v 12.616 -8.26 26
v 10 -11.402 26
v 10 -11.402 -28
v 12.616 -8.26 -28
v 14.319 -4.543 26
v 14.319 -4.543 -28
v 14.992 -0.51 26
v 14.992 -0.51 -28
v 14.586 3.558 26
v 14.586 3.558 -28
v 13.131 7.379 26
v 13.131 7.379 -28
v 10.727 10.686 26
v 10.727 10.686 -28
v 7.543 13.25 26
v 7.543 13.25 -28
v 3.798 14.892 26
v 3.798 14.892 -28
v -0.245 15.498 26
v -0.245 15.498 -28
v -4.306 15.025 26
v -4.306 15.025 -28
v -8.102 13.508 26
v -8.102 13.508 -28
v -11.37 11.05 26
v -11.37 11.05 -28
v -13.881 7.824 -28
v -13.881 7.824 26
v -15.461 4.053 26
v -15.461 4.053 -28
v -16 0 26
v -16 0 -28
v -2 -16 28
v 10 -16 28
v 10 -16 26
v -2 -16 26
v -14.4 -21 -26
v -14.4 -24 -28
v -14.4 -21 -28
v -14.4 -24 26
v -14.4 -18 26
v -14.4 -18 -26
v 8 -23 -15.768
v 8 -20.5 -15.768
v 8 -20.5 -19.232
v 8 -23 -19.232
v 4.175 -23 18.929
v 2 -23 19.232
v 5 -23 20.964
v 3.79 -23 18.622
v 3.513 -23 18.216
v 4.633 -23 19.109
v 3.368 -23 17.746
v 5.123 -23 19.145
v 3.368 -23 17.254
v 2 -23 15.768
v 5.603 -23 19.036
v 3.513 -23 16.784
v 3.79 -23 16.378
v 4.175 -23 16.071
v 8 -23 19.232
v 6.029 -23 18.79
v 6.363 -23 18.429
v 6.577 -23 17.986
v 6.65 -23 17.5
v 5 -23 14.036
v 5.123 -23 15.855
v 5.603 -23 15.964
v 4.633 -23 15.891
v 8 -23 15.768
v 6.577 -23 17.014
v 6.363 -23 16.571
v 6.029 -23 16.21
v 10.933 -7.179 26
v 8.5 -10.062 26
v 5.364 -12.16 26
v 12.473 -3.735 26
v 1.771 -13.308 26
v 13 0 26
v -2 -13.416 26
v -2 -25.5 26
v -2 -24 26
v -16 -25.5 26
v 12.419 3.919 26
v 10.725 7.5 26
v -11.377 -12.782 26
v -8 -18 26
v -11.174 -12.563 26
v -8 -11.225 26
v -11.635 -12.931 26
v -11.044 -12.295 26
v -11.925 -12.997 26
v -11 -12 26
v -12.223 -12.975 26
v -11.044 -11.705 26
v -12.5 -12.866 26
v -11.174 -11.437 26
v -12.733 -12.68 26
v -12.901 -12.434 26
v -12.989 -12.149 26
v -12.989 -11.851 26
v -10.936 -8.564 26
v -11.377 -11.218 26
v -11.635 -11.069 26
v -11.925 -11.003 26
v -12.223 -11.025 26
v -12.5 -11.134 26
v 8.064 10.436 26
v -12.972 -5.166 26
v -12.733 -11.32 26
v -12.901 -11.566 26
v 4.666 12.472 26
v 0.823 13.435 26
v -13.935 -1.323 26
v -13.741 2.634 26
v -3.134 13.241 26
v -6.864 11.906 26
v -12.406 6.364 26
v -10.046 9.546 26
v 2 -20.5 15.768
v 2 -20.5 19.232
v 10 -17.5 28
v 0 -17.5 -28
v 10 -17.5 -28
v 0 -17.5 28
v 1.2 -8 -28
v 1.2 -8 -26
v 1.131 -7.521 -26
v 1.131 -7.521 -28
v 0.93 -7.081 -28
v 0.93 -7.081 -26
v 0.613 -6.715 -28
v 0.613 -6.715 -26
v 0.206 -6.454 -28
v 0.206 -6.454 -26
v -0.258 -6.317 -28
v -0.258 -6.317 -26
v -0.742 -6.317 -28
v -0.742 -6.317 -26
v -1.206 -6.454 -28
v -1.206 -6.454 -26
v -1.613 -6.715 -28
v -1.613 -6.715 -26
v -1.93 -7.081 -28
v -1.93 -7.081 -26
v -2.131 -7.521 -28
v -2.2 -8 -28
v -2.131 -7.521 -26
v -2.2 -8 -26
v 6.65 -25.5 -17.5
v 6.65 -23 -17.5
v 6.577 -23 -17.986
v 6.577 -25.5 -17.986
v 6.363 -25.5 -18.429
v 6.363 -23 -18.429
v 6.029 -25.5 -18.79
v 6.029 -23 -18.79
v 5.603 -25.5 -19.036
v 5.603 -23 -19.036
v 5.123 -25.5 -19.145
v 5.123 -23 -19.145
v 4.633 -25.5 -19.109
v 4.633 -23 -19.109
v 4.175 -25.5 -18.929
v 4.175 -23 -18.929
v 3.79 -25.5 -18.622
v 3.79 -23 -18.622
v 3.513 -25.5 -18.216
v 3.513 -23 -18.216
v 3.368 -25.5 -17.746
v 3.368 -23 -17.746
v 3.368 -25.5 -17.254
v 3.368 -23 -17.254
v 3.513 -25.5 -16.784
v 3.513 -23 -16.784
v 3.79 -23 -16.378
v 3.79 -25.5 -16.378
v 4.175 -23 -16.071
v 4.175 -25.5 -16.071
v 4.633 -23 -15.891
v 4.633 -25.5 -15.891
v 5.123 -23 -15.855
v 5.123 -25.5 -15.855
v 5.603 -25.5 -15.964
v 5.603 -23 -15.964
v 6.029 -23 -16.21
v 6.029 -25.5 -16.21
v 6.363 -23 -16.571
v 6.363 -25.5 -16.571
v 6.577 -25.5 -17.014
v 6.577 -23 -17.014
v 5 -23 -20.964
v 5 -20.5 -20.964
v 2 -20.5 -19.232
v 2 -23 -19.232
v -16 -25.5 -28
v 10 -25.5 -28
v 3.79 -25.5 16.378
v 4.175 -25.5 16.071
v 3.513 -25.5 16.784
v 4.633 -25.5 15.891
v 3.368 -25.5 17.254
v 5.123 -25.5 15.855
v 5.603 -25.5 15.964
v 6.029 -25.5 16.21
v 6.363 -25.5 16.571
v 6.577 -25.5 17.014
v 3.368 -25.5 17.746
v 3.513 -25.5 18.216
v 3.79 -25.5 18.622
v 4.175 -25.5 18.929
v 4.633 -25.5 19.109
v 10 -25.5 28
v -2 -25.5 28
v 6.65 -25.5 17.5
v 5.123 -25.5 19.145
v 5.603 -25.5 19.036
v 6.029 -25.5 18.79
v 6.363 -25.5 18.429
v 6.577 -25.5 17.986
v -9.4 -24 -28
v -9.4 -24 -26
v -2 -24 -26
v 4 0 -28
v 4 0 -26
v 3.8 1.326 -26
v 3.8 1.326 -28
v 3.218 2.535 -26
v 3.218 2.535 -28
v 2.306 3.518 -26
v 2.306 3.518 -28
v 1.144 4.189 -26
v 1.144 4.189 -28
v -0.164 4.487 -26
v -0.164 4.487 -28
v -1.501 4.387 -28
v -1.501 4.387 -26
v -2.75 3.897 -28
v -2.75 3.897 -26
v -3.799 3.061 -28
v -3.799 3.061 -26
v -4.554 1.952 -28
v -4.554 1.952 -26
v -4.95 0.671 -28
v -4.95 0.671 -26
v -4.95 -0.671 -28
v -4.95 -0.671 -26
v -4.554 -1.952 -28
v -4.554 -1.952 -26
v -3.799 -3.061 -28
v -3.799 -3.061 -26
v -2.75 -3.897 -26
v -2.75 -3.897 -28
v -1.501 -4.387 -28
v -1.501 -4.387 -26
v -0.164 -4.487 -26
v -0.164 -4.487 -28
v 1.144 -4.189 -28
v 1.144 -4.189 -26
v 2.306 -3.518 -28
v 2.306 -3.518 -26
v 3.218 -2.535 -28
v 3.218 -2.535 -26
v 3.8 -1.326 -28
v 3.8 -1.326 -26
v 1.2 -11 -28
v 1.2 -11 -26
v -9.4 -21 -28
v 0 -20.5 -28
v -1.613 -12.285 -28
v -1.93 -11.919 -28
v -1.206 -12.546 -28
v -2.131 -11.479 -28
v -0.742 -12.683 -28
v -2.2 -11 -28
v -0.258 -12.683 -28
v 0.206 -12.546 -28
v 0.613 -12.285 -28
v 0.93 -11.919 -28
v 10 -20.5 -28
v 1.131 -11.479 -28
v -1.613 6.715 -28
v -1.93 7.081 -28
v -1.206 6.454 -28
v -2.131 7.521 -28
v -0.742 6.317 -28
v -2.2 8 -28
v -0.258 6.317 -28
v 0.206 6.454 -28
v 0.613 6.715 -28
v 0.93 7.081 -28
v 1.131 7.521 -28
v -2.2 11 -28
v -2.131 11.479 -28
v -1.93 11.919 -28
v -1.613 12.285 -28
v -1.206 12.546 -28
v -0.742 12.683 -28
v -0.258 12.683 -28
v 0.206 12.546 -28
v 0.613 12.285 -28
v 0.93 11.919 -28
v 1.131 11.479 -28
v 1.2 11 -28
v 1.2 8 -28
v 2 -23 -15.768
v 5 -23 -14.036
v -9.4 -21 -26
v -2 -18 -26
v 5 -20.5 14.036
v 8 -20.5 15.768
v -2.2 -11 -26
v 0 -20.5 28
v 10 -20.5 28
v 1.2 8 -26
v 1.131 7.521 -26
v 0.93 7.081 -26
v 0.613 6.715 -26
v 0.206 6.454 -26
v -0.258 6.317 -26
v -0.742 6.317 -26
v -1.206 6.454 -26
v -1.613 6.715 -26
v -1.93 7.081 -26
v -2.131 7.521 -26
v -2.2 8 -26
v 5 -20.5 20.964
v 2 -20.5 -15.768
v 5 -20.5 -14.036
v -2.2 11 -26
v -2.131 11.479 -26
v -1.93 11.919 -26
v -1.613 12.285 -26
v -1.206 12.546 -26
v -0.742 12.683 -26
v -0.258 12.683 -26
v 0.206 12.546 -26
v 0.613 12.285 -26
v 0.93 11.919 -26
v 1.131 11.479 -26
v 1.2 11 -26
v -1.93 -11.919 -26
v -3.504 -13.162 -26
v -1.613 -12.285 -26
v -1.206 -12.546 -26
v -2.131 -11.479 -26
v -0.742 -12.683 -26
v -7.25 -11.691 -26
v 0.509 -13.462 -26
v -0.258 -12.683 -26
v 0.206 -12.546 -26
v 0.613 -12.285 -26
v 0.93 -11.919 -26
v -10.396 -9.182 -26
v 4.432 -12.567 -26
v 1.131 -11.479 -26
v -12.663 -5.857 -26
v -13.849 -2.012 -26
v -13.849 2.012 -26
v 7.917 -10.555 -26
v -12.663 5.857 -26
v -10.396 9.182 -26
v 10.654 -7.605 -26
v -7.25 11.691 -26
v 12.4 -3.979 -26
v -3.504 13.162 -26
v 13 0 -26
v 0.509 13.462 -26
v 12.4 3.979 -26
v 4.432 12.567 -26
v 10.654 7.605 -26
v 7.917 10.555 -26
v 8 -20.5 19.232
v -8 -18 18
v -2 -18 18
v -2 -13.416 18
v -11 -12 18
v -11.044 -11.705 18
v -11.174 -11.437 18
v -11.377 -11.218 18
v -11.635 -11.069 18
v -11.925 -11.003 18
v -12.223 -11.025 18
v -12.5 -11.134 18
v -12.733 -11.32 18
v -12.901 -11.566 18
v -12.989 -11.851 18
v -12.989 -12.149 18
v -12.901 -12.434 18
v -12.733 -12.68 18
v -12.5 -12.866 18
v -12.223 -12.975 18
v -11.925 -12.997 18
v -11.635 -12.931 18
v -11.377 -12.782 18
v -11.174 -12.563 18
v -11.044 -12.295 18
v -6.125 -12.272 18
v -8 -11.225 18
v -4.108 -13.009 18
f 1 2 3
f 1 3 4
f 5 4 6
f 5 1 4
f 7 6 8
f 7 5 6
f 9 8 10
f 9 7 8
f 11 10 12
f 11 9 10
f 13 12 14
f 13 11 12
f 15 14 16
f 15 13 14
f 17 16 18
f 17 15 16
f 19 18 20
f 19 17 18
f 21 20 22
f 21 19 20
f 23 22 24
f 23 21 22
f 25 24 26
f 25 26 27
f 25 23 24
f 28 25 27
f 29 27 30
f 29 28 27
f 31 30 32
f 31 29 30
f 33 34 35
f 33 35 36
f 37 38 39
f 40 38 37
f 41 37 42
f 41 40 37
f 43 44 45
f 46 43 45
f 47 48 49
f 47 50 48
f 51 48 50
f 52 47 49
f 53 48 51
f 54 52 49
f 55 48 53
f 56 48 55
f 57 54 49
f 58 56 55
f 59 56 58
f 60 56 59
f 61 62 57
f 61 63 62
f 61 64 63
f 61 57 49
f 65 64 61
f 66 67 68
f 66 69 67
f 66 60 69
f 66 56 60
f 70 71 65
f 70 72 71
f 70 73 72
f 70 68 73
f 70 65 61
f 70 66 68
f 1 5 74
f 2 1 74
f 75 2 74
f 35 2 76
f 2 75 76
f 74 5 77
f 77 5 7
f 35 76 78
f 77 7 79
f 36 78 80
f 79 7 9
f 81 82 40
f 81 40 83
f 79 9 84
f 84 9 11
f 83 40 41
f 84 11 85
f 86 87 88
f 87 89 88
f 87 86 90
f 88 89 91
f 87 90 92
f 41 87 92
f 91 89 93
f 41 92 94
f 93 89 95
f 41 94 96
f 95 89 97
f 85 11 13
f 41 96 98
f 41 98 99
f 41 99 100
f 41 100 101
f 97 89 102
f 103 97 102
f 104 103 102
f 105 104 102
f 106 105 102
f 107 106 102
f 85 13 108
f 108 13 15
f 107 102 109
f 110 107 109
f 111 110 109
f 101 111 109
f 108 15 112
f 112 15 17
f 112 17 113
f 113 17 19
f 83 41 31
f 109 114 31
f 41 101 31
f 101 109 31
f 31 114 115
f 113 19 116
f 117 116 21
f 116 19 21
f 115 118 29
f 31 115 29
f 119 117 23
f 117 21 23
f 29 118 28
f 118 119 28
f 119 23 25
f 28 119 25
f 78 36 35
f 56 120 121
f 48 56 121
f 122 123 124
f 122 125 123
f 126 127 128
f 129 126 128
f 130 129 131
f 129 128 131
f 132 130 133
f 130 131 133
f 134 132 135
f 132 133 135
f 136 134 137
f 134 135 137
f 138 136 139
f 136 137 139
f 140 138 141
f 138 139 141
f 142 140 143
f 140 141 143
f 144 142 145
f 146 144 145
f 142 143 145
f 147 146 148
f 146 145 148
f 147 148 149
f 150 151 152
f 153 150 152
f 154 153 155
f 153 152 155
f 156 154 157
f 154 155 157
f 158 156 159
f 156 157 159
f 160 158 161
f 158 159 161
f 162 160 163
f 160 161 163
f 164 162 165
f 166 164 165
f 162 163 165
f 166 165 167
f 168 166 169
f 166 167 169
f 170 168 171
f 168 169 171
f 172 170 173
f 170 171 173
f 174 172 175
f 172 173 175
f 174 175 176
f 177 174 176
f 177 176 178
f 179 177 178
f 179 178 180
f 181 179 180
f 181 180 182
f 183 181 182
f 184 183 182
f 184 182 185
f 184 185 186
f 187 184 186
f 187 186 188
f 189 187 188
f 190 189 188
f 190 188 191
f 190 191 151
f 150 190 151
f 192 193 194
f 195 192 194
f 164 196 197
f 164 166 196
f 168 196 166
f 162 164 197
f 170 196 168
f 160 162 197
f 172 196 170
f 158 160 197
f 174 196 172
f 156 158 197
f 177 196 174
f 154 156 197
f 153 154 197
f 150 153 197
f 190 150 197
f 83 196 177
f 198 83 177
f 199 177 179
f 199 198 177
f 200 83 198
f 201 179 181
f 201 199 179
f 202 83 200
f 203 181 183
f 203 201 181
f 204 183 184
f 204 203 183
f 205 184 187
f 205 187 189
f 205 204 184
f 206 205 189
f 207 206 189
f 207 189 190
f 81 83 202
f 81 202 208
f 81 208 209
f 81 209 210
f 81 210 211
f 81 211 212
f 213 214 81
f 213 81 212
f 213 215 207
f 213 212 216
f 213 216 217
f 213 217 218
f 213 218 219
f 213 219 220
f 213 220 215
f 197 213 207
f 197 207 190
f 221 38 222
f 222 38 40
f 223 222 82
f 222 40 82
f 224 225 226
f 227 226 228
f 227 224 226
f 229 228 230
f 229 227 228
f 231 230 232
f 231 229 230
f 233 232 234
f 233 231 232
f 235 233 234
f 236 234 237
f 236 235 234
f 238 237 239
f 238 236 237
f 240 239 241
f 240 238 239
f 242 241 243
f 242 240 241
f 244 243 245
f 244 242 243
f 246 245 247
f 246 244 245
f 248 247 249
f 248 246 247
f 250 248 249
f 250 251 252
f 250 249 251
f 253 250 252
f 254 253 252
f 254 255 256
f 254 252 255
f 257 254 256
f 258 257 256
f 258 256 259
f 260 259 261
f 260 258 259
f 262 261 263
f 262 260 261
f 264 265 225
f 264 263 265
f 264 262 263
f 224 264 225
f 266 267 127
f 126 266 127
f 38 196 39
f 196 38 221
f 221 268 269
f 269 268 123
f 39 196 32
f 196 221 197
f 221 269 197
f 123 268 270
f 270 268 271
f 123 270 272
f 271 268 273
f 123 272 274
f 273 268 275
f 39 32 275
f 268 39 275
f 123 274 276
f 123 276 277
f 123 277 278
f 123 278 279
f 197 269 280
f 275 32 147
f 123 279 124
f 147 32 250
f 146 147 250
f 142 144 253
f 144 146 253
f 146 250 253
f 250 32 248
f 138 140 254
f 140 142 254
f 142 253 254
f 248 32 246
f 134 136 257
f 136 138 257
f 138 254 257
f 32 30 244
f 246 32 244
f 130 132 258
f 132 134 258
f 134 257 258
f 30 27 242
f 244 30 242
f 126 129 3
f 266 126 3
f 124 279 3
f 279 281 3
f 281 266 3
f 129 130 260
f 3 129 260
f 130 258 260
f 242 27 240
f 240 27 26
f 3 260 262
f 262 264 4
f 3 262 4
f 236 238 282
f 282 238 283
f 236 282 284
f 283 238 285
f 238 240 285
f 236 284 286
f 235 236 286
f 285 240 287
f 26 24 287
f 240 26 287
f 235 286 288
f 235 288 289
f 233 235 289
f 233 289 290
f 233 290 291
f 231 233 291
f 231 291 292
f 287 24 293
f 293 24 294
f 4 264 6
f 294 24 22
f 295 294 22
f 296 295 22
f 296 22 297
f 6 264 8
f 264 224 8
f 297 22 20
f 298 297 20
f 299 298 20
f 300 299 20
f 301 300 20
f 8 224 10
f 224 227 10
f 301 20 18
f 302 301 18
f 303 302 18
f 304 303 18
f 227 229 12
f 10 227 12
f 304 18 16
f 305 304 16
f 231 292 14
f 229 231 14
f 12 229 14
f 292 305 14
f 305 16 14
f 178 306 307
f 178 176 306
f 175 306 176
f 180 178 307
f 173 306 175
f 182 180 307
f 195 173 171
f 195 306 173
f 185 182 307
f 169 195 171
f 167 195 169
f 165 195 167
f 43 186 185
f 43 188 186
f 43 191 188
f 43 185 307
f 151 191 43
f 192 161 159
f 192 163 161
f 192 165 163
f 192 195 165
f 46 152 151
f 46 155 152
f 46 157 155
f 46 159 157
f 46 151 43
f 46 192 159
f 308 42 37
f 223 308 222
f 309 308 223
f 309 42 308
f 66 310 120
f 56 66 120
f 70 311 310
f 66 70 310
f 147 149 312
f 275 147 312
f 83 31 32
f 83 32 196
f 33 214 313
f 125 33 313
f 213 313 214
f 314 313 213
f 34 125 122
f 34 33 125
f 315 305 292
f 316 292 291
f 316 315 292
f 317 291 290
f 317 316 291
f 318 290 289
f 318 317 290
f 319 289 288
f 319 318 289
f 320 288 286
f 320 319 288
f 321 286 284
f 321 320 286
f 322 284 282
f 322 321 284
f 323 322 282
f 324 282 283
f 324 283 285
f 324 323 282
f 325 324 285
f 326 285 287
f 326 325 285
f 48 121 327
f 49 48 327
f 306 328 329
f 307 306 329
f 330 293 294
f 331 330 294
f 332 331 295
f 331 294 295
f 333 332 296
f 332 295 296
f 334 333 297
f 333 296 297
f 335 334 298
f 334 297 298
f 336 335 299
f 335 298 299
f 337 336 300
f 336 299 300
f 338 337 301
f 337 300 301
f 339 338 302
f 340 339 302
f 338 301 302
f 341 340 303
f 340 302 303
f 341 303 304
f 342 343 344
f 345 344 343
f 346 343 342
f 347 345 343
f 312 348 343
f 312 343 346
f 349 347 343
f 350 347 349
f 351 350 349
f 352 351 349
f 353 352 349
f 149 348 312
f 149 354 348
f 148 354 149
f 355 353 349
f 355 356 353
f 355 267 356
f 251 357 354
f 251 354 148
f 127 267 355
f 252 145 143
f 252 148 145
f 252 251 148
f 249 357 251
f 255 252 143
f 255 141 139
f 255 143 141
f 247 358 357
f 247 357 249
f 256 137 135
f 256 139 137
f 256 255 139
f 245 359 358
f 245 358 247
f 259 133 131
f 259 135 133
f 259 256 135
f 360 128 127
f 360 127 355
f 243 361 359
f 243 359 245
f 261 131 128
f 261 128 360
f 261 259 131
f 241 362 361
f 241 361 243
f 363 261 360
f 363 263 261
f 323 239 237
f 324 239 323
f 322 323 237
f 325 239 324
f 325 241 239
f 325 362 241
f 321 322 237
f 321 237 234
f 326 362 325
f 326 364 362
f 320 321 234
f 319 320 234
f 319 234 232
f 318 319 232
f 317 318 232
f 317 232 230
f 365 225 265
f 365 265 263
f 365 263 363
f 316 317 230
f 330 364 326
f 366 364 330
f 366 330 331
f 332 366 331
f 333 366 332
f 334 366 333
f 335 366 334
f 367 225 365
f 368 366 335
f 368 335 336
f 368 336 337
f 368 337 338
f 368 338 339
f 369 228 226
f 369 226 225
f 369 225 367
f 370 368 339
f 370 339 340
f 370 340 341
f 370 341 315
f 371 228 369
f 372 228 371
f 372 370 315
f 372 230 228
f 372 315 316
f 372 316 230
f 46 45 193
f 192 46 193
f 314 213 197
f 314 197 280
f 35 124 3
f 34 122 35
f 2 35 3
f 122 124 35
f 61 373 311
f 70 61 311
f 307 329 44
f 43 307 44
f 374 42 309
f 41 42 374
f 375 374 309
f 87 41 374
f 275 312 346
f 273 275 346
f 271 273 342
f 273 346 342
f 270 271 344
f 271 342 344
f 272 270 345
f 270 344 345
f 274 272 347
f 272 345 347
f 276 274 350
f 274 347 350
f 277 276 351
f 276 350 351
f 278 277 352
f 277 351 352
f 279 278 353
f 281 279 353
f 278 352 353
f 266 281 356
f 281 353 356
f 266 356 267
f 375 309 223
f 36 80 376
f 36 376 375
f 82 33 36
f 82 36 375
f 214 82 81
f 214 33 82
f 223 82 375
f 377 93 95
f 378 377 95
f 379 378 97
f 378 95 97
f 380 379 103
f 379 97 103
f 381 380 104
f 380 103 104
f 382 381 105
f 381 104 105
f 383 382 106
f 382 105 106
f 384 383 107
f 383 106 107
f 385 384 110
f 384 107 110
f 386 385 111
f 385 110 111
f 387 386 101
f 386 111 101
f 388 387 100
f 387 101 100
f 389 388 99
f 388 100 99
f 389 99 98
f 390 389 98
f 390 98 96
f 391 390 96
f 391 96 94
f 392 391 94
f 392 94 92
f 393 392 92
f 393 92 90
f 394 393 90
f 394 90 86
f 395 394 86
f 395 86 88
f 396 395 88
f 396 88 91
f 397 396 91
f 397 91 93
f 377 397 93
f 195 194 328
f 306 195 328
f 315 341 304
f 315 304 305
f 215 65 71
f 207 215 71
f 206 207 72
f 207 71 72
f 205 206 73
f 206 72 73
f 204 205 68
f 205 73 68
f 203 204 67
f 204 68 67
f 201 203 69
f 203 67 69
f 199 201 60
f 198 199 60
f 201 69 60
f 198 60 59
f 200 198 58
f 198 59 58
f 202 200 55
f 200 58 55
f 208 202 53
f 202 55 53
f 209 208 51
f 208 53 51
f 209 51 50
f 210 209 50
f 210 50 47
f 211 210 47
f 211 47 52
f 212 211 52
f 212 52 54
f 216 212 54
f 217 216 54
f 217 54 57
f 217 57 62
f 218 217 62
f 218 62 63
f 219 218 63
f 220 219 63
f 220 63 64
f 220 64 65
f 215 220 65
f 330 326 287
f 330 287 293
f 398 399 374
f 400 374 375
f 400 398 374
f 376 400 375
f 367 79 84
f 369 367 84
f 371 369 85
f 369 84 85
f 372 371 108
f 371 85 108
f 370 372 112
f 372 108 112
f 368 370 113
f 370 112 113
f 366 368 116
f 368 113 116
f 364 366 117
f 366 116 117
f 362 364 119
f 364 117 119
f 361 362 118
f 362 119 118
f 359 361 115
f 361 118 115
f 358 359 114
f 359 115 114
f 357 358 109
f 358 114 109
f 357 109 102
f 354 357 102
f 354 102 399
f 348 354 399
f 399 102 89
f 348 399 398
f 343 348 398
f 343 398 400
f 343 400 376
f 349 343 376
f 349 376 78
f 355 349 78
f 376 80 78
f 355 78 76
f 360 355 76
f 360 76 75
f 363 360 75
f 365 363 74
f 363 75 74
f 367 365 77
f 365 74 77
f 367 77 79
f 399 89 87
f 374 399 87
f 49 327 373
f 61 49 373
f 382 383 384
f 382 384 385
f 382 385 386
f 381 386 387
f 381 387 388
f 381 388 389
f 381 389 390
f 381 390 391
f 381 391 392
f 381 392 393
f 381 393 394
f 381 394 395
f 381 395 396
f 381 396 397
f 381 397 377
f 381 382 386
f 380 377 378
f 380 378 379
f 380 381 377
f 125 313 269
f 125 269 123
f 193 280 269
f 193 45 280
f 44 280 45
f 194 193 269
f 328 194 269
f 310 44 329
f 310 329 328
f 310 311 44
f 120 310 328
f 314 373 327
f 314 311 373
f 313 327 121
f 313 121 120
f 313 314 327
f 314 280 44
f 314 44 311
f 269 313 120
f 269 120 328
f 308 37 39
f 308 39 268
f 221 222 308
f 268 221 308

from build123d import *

# Parameters (mm, degrees)
ESBO_O1_R                = 4.5
RESSALTO_EXTRUS_O1_DEPTH = 28
CORTE_EXTRUS_O5_START    = 28
ESBO_O1_3_R              = 13.5
ESBO_O1_3_W              = 12.4
ESBO_O1_3_H              = 6
CORTE_EXTRUS_O5_DEPTH    = 54
ESBO_O3_R                = 1
CORTE_EXTRUS_O3_DEPTH    = 10
CORTE_EXTRUS_O4_DEPTH    = 2
ESBO_O5_R                = 1.65
CORTE_EXTRUS_O6_DEPTH    = 2.5
ESBO_O5_2_R              = 1.65
CORTE_EXTRUS_O7_DEPTH    = 6
ESBO_O6_W                = 5
ESBO_O6_H                = 3
CORTE_EXTRUS_O8_DEPTH    = 3


with BuildPart() as part:
    # Esboço1 → Ressalto-extrusão1 (new body, symmetric)
    with BuildSketch(Plane.XY):
        with BuildLine():
            Line((-16, 0), (-16, -25.5))
            Line((-16, -25.5), (10, -25.5))
            Line((10, -25.5), (10, -20.5))
            Line((10, -20.5), (0, -20.5))
            Line((0, -20.5), (0, -17.5))
            Line((0, -17.5), (10, -17.5))
            Line((10, -17.5), (10, -11.401754251))
            ThreePointArc((10, -11.401754251), (5.724949799, 14.195069567), (-16, 0))
        make_face()
        with Locations((-0.5, 0)):
            Circle(ESBO_O1_R, mode=Mode.SUBTRACT)
        with BuildLine():
            Line((-2.2, 8), (-2.2, 11))
            ThreePointArc((-2.2, 11), (-0.5, 12.7), (1.2, 11))
            Line((1.2, 11), (1.2, 8))
            ThreePointArc((1.2, 8), (-0.5, 6.3), (-2.2, 8))
        make_face(mode=Mode.SUBTRACT)
        with BuildLine():
            Line((-2.2, -8), (-2.2, -11))
            ThreePointArc((-2.2, -11), (-0.5, -12.7), (1.2, -11))
            Line((1.2, -11), (1.2, -8))
            ThreePointArc((1.2, -8), (-0.5, -6.3), (-2.2, -8))
        make_face(mode=Mode.SUBTRACT)
    extrude(amount=RESSALTO_EXTRUS_O1_DEPTH, both=True)

    # Esboço1<3> → Corte-extrusão5 (cut)
    with BuildSketch(Plane.XY.offset(CORTE_EXTRUS_O5_START)):
        with Locations((-0.5, 0)):
            Circle(ESBO_O1_3_R)
        with Locations((-8.2, -21)):
            Rectangle(ESBO_O1_3_W, ESBO_O1_3_H)
    extrude(amount=-CORTE_EXTRUS_O5_DEPTH, mode=Mode.SUBTRACT)

    # Esboço3 → Corte-extrusão3 (cut)
    with BuildSketch(Plane.XY.offset(28)):
        with Locations((-12, -12)):
            Circle(ESBO_O3_R)
        Polygon((-8, -11.22497216), (-8, -18), (-2, -18), (-2, -13.416407865), align=None)
    extrude(amount=-CORTE_EXTRUS_O3_DEPTH, mode=Mode.SUBTRACT)

    # Esboço4 → Corte-extrusão4 (cut)
    with BuildSketch(Plane.XY.offset(28)):
        with BuildLine():
            Line((-2, -25.5), (-16, -25.5))
            Line((-16, -25.5), (-16, 0))
            ThreePointArc((-16, 0), (5.724949799, 14.195069567), (10, -11.401754251))
            Line((10, -11.401754251), (10, -16))
            Line((10, -16), (-2, -16))
            Line((-2, -16), (-2, -25.5))
        make_face()
    extrude(amount=-CORTE_EXTRUS_O4_DEPTH, mode=Mode.SUBTRACT)

    # Esboço5 → Corte-extrusão6 (cut)
    with BuildSketch(Plane(origin=(0, -20.5, 0), x_dir=(1, 0, 0), z_dir=(0, 1, 0))):
        Polygon((5, 14.035898385), (8, 15.767949192), (8, 19.232050808), (5, 20.964101615), (2, 19.232050808), (2, 15.767949192), align=None)
        with Locations((5, 17.5)):
            Circle(ESBO_O5_R, mode=Mode.SUBTRACT)
        Polygon((5, -20.964101615), (8, -19.232050808), (8, -15.767949192), (5, -14.035898385), (2, -15.767949192), (2, -19.232050808), align=None)
        with Locations((5, -17.5)):
            Circle(ESBO_O5_R, mode=Mode.SUBTRACT)
    extrude(amount=-CORTE_EXTRUS_O6_DEPTH, mode=Mode.SUBTRACT)

    # Esboço5<2> → Corte-extrusão7 (cut, through all)
    with BuildSketch(Plane(origin=(0, -20.5, 0), x_dir=(1, 0, 0), z_dir=(0, 1, 0))):
        with Locations((5, -17.5)):
            Circle(ESBO_O5_2_R)
        with Locations((5, 17.5)):
            Circle(ESBO_O5_2_R)
    extrude(amount=-CORTE_EXTRUS_O7_DEPTH, mode=Mode.SUBTRACT)

    # Esboço6 → Corte-extrusão8 (cut, through all)
    with BuildSketch(Plane.XY.offset(-26)):
        with Locations((-11.9, -22.5)):
            Rectangle(ESBO_O6_W, ESBO_O6_H)
    extrude(amount=-CORTE_EXTRUS_O8_DEPTH, mode=Mode.SUBTRACT)


solid = part.part
